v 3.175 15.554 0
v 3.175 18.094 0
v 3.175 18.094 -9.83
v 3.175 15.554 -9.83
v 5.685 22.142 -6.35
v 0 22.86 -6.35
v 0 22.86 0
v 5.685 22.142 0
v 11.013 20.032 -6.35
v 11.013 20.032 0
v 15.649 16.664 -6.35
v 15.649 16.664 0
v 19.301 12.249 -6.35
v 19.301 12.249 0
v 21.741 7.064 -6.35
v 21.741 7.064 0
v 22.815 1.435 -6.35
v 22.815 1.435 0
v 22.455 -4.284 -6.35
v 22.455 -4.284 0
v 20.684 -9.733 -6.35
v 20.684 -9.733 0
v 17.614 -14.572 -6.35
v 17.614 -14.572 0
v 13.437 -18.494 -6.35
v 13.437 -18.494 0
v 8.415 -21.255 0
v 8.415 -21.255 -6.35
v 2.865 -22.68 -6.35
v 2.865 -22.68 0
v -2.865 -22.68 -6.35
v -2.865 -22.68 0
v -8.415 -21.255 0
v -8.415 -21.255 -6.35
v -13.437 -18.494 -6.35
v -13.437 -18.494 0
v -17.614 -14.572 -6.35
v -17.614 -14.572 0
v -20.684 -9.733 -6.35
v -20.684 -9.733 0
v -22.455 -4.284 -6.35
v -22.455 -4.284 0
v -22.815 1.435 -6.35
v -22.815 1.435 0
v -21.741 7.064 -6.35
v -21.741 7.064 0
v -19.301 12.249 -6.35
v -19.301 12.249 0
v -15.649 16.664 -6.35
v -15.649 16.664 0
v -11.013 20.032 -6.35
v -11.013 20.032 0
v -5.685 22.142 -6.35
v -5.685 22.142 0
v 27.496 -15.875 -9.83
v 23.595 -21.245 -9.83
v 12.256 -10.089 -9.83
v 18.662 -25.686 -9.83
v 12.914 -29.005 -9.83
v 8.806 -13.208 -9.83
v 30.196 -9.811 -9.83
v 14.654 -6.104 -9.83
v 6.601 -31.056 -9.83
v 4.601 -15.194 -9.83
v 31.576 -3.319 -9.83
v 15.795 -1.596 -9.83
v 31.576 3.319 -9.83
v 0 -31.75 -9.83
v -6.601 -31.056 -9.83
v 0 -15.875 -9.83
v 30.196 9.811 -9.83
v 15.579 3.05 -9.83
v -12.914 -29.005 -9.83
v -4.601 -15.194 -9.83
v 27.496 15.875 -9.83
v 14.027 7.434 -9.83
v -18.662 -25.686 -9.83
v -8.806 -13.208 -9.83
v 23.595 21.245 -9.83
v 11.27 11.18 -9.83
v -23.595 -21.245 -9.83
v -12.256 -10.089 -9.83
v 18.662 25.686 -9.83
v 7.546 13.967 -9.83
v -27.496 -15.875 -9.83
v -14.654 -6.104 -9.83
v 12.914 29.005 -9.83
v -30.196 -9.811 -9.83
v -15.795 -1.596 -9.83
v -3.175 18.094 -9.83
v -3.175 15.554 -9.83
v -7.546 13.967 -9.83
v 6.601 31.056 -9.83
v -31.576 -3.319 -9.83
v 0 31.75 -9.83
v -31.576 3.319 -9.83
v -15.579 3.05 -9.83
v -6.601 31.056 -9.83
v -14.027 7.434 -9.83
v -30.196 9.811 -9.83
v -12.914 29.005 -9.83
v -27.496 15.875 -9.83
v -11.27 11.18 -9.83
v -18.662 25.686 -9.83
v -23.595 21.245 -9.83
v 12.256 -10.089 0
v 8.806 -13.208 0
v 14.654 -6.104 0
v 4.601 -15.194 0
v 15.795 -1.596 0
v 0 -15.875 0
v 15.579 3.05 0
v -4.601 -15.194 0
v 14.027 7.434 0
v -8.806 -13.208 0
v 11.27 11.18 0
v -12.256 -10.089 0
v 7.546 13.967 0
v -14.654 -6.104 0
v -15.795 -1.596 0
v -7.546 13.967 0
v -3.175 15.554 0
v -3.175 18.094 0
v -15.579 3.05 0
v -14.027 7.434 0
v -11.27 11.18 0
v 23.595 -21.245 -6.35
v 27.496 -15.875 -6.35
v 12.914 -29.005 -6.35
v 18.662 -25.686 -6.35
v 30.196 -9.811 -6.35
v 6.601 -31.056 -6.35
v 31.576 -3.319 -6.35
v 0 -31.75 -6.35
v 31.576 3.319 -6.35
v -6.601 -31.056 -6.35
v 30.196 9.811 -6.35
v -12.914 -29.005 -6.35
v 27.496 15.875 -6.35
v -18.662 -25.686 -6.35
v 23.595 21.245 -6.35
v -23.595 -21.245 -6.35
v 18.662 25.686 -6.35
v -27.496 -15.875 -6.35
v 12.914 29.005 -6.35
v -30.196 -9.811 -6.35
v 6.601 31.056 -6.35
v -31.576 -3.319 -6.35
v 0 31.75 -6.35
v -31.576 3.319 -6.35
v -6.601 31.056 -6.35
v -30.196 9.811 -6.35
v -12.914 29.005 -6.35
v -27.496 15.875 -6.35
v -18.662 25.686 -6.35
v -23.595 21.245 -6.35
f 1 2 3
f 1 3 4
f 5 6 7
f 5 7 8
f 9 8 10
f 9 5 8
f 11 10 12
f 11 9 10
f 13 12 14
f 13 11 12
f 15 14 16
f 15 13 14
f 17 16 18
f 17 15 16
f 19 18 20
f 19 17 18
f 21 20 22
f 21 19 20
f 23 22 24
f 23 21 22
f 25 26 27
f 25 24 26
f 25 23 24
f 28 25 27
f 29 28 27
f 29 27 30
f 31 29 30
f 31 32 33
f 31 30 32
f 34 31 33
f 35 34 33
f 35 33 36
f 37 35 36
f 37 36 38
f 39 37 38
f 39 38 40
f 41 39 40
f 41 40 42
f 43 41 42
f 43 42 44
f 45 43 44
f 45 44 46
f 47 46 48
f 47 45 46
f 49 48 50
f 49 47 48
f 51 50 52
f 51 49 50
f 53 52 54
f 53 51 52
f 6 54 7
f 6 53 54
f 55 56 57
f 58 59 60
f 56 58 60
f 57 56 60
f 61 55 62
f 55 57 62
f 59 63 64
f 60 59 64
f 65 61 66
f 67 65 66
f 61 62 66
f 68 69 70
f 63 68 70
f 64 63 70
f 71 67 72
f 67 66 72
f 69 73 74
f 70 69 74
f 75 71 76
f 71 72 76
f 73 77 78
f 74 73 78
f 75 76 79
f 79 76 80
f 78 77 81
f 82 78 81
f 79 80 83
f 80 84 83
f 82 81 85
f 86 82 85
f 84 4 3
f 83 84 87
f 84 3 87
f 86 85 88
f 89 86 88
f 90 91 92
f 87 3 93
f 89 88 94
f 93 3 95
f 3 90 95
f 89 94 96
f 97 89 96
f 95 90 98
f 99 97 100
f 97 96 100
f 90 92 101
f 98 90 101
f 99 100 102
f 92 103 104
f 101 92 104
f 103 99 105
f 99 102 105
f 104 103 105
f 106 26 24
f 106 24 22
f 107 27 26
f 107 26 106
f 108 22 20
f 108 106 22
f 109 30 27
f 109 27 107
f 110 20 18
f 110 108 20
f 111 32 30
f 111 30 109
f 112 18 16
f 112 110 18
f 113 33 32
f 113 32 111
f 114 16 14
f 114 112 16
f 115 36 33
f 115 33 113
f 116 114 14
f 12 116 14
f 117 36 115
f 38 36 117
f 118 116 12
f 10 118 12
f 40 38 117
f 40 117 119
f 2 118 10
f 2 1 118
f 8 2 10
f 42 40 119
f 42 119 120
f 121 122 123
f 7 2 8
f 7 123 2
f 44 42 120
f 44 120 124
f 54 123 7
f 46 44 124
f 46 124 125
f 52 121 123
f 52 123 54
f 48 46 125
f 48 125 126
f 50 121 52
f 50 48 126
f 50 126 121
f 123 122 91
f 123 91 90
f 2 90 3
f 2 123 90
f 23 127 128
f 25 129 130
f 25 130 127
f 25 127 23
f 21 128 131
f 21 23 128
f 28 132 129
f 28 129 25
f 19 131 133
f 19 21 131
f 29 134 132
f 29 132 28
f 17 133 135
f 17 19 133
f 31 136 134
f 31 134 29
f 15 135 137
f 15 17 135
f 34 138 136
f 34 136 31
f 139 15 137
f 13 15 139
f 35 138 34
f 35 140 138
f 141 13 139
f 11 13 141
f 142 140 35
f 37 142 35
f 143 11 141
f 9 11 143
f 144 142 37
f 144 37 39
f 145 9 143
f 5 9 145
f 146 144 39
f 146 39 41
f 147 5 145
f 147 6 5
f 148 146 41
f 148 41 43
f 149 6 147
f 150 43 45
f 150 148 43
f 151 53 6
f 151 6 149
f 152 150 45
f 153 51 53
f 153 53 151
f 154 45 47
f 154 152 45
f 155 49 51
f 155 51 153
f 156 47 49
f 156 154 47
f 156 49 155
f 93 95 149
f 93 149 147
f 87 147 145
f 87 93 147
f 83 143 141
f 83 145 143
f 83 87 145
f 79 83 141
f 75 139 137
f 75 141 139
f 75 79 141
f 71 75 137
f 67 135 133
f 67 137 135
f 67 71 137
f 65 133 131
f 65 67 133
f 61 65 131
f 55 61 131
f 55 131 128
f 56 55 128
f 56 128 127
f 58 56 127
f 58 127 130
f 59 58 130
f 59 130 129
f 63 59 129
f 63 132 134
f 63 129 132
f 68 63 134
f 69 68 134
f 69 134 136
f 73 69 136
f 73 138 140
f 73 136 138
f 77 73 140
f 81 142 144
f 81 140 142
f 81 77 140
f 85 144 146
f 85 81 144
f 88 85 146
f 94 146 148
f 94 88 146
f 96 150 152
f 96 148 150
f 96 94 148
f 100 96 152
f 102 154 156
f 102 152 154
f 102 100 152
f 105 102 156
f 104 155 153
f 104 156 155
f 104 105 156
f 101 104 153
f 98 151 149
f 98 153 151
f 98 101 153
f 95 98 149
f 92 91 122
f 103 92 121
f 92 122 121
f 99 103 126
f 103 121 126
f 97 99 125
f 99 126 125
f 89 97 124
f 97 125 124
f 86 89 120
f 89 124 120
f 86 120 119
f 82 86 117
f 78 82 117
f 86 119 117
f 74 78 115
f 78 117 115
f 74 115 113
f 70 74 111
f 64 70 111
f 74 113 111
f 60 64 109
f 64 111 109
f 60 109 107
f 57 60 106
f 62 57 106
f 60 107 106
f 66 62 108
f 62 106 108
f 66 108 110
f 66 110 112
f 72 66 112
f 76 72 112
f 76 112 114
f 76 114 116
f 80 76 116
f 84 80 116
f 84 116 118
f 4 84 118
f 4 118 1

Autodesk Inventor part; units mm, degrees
ref_plane "YZ Plane" through (0, 0, 0) normal (1, 0, 0) x (0, 1, 0)
ref_plane "XZ Plane" through (0, 0, 0) normal (0, 1, 0) x (-1, 0, 0)
ref_plane "XY Plane" through (0, 0, 0) normal (0, 0, 1) x (1, 0, 0)
sketch "Sketch1" plane through (0, 0, 0) normal (1, 0, 0) x (0, 1, 0)
  line L0 (0, 0) -> (22.86, 0)
  line L1 (22.86, 0) -> (22.86, -6.35)
  line L2 (22.86, -6.35) -> (31.75, -6.35)
  line L3 (31.75, -6.35) -> (31.75, -9.8298)
  line L4 (31.75, -9.8298) -> (0, -9.8298)
  line L5 (0, -9.8298) -> (0, 0)
  dimension "d0" = 22.86
  dimension "d1" = 6.35
  dimension "d2" = 8.89
  dimension "d3" = 3.4798
revolve "Revolution1" add sketch "Sketch1" angle 360 about axis through (0, 0, -9.8298) along (0, 0, 1)
sketch "Sketch2" plane through (0, 0, 0) normal (0, 0, 1) x (1, 0, 0)
  circle A0 centre (0, 0) radius 15.875
  line L0 (-3.175, 15.5543) -> (-3.175, 18.0943)
  line L1 (-3.175, 18.0943) -> (3.175, 18.0943)
  line L2 (3.175, 18.0943) -> (3.175, 15.5543)
  line L3 (0, 0) -> (0, 24.2947)
  point P0 (0, 0)
  point P1 (0, 18.0943)
  dimension "d5" = 31.75
  dimension "d6" = 6.35
  dimension "d7" = 2.54
extrude "Extrusion1" cut sketch "Sketch2" against normal through all
sketch "Sketch3" plane through (0, 0, -6.35) normal (0, 0, 1) x (1, 0, 0)
  point P0 (0, 0)
properties part number "SprocketAdapter"
